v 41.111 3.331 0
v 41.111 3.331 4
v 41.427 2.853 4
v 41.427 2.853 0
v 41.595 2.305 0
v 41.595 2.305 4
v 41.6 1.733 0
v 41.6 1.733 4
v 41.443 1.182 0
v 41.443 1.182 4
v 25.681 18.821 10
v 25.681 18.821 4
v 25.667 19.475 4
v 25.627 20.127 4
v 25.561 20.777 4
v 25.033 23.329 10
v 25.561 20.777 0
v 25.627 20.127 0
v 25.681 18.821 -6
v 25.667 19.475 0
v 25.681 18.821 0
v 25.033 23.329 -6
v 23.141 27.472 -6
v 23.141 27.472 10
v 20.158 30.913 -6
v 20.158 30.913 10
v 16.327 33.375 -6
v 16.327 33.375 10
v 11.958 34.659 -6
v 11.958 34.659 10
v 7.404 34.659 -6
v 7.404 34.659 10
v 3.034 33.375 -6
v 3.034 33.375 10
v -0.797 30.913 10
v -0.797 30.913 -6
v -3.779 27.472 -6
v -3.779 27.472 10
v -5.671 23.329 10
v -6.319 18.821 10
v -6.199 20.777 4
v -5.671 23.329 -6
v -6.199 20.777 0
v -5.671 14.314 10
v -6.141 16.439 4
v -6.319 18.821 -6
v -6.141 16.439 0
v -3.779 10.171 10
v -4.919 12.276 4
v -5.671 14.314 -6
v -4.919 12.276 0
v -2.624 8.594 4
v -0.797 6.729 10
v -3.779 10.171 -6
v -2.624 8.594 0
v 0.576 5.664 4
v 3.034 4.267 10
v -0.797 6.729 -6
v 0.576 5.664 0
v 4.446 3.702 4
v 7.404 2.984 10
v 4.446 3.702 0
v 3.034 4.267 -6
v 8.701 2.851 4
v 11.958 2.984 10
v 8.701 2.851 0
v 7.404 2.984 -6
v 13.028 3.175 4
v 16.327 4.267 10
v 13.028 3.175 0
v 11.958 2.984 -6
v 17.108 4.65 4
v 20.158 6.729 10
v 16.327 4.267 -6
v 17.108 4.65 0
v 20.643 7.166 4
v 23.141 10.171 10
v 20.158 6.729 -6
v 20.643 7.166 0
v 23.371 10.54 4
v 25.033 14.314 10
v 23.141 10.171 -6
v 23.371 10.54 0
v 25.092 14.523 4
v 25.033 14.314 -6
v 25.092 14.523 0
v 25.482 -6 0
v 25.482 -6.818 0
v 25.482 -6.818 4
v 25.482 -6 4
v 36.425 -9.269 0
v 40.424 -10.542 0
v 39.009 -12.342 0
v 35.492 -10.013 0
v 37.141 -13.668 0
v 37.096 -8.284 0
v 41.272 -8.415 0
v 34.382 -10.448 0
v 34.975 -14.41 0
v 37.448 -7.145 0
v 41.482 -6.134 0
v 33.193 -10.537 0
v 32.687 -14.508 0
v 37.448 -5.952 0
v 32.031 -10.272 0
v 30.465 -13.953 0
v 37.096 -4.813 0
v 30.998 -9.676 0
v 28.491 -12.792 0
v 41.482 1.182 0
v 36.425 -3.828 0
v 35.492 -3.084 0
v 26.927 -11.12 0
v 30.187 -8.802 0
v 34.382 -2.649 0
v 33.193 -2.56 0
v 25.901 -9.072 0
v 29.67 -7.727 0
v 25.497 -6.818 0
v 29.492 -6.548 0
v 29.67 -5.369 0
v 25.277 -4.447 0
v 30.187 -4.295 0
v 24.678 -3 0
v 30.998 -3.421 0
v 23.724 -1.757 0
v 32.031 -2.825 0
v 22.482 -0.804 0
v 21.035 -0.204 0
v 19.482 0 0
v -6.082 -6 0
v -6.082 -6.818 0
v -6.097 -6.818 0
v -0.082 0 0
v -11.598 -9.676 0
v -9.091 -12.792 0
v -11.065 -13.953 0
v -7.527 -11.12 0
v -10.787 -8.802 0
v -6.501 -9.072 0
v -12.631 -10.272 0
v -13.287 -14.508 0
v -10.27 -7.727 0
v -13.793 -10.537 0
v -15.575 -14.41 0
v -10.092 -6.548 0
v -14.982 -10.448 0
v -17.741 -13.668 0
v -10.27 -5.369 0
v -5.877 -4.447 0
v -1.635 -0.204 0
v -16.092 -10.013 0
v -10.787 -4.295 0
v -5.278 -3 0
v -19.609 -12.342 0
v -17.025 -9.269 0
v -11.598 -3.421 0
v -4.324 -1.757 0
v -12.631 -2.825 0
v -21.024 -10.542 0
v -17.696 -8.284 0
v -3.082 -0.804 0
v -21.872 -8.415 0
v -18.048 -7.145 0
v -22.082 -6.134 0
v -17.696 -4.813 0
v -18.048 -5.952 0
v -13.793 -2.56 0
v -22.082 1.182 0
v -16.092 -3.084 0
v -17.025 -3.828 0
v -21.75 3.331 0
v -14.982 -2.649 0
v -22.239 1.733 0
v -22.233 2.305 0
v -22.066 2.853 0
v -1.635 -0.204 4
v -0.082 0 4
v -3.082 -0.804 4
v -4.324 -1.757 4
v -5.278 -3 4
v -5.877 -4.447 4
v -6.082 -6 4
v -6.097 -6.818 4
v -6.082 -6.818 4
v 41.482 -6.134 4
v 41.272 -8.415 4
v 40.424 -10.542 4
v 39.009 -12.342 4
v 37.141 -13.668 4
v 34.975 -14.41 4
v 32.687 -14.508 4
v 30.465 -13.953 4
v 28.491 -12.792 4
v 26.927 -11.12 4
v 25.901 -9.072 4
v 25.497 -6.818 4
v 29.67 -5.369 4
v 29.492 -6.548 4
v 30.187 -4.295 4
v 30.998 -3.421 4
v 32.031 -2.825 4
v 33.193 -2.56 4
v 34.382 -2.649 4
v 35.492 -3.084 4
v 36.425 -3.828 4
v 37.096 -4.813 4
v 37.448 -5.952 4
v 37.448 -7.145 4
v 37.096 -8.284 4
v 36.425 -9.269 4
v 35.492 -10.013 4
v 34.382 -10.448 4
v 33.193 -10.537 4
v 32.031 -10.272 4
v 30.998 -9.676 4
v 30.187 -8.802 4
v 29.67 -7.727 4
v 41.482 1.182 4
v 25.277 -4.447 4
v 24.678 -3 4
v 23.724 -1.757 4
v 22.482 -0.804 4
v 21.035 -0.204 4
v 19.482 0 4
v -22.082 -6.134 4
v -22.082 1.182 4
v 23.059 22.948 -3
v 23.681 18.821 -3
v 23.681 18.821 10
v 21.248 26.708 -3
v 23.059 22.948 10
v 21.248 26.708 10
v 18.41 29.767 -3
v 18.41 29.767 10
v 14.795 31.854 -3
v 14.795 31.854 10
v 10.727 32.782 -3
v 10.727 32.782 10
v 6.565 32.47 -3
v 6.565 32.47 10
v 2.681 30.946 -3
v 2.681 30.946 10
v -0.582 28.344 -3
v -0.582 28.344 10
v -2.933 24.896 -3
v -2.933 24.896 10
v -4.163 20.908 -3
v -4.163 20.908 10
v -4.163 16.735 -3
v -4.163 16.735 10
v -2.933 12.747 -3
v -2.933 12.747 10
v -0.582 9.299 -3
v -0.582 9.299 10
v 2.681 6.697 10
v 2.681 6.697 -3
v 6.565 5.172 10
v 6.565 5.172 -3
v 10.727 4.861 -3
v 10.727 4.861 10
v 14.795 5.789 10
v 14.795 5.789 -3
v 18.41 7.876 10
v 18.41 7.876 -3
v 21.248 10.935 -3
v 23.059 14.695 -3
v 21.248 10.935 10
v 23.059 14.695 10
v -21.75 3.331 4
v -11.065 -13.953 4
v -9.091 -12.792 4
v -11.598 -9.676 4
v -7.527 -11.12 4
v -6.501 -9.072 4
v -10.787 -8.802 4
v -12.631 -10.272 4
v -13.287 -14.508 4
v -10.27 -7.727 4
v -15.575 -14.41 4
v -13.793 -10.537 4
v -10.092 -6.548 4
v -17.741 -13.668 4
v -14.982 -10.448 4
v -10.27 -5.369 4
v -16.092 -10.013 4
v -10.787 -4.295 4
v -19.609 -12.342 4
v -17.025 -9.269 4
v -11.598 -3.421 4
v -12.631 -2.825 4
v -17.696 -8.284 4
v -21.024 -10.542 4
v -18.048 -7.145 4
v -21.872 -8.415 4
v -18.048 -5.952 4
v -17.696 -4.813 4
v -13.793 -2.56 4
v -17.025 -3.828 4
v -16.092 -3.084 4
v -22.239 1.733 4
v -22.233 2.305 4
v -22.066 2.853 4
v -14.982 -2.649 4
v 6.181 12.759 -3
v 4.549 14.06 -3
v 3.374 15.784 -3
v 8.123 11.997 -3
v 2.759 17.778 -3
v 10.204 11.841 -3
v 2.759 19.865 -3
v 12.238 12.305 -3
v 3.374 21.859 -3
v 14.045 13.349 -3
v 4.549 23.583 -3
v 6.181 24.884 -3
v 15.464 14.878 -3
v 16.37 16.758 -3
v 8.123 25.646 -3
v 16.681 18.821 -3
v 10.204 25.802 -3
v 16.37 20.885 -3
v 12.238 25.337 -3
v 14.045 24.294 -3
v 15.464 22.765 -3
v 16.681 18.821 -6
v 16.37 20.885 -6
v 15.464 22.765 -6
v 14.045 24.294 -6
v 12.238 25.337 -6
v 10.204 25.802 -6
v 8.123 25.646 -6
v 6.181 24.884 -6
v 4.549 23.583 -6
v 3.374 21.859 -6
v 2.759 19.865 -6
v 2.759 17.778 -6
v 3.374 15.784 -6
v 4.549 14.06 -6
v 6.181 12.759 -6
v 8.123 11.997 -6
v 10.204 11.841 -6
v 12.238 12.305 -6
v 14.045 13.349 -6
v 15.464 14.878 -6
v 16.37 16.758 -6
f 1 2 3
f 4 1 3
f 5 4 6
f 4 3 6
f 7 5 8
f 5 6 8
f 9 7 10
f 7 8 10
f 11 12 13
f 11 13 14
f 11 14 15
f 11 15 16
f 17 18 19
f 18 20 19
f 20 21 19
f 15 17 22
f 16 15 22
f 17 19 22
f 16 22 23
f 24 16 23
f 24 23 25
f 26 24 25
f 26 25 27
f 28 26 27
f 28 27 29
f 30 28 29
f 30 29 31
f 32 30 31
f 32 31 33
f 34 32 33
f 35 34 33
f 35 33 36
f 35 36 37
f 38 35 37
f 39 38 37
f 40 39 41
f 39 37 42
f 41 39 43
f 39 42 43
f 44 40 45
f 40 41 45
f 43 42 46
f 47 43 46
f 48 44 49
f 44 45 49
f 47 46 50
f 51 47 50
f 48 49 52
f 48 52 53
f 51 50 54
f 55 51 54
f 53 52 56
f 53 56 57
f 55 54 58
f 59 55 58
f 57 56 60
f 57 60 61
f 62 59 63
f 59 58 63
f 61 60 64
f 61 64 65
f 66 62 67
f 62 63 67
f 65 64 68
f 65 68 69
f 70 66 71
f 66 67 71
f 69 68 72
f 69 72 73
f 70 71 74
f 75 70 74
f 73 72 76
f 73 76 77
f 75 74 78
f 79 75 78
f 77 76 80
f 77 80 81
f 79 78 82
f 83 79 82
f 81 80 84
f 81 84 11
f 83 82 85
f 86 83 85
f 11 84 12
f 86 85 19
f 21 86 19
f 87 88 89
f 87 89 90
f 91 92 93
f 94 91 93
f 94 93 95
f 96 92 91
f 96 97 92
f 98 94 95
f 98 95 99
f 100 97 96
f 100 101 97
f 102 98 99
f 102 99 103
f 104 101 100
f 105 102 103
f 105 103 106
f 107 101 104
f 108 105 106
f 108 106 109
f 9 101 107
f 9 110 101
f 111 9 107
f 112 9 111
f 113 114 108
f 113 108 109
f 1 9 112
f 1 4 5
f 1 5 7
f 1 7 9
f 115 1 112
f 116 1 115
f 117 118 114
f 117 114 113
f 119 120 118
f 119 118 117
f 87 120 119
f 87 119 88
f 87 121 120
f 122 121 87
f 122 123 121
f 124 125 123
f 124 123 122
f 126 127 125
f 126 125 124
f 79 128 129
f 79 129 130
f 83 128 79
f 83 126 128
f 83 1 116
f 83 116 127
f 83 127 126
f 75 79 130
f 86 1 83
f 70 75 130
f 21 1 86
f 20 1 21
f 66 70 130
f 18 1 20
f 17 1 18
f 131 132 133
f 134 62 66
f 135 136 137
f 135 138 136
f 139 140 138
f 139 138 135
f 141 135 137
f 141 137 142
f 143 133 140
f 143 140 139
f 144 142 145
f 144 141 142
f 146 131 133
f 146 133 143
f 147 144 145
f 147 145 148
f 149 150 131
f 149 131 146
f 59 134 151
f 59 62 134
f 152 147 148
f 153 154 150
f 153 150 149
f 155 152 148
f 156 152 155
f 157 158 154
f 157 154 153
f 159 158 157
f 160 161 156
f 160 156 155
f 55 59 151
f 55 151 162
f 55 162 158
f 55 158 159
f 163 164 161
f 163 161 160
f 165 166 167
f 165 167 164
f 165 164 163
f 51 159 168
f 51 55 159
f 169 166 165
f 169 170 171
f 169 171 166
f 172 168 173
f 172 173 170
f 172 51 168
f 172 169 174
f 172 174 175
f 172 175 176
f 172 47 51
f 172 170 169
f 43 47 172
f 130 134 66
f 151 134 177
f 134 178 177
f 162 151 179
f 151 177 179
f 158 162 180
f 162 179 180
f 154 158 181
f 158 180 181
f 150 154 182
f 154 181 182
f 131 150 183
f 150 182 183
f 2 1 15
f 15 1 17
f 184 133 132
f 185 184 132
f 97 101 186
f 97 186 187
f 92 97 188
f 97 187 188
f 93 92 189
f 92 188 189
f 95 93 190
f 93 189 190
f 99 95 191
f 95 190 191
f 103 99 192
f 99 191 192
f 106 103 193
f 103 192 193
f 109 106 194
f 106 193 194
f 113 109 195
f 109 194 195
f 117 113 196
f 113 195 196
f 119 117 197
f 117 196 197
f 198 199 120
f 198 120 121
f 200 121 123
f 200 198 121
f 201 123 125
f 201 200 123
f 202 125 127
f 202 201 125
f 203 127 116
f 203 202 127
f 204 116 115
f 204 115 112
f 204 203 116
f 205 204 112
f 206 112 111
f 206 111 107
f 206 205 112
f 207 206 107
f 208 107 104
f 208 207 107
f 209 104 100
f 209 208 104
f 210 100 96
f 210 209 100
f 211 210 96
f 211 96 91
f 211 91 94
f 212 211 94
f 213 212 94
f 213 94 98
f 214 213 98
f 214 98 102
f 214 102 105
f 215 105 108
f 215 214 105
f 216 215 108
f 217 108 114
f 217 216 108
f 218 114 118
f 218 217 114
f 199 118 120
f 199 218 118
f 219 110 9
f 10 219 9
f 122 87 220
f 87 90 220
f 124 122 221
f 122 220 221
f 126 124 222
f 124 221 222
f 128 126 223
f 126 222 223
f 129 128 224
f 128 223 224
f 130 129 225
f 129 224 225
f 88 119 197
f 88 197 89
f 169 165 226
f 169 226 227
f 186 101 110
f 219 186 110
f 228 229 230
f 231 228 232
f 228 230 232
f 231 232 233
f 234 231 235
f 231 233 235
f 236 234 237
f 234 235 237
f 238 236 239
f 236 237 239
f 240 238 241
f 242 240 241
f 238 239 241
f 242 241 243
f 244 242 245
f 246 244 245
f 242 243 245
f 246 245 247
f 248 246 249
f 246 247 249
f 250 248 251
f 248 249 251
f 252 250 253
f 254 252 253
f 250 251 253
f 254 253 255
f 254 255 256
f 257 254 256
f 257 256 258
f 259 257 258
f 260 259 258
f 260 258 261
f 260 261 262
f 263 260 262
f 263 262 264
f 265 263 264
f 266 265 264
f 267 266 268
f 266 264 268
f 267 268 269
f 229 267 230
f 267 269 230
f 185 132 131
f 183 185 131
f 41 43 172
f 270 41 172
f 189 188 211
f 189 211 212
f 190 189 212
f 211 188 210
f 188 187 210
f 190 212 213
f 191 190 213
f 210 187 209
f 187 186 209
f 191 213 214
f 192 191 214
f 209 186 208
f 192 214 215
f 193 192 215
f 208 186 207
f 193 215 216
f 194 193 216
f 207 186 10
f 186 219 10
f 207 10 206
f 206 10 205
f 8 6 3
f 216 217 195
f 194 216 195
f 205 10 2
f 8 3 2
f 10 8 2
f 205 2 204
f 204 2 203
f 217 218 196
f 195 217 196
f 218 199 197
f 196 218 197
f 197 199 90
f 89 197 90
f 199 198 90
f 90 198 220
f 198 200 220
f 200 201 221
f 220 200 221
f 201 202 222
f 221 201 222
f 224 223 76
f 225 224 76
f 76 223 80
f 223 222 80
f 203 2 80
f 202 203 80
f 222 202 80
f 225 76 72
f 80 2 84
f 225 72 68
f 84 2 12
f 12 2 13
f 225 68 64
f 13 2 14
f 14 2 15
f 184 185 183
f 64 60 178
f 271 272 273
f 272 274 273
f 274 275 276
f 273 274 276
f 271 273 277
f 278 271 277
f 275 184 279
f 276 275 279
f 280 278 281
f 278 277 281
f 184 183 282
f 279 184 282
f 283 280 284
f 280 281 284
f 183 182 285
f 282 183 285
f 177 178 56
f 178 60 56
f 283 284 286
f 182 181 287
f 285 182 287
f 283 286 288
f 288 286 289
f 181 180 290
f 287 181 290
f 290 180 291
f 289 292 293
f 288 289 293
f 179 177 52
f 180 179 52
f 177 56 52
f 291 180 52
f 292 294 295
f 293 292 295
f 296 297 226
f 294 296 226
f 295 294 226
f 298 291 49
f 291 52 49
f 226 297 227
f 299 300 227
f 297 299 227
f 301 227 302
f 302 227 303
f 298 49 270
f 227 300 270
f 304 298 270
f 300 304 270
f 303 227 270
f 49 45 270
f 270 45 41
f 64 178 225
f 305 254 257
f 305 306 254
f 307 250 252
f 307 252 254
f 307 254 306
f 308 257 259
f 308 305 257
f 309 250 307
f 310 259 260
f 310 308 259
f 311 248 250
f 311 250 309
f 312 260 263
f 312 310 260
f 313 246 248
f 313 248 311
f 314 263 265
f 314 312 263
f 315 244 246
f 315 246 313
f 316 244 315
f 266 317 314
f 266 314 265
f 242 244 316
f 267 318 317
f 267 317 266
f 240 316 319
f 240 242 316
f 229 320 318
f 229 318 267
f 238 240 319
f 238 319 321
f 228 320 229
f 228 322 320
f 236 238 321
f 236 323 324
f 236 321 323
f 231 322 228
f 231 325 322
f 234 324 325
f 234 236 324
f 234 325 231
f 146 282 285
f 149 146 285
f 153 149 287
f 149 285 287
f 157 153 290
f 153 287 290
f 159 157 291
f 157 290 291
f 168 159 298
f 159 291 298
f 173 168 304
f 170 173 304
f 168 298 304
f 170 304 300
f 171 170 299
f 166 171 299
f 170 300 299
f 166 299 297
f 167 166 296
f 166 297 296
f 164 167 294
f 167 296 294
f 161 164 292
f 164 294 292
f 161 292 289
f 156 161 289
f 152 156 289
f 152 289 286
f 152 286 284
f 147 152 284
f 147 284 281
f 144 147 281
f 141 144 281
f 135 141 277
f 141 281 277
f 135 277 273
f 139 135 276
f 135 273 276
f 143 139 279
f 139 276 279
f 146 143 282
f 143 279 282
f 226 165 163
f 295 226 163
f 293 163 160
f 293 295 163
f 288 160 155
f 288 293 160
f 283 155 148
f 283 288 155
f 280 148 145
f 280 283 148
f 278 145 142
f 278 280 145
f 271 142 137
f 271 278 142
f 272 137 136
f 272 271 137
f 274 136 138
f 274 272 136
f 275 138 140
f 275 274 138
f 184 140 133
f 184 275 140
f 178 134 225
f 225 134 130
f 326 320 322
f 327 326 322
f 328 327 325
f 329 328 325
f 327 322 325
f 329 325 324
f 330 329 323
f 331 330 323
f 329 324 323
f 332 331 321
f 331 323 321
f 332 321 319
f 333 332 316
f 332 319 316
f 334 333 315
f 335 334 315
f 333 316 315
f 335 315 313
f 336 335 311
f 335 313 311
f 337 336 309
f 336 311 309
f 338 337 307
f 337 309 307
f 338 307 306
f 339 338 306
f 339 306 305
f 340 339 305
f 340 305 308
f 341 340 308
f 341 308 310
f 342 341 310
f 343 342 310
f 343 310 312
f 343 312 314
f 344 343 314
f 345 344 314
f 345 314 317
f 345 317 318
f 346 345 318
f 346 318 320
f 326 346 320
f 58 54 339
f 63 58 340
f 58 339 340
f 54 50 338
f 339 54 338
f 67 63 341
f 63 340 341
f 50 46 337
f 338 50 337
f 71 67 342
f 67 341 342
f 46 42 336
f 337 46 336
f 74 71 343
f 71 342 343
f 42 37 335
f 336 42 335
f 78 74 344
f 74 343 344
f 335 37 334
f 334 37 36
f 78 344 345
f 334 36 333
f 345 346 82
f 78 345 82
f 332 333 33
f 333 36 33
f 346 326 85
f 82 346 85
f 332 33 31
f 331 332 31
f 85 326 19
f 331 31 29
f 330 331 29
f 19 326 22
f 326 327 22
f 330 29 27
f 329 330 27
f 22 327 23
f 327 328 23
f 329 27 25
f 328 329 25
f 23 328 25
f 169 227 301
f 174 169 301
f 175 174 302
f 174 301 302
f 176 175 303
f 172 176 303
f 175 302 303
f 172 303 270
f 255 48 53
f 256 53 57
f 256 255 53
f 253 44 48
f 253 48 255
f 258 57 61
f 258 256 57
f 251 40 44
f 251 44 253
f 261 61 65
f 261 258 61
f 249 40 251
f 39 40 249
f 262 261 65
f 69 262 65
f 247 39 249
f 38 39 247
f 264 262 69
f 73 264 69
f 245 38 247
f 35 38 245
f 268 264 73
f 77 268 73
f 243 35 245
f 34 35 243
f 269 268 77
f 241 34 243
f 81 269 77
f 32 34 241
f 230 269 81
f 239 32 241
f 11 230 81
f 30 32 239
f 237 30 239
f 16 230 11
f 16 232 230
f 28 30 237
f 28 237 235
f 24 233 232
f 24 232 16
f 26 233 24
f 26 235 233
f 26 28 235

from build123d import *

# Parameters (mm, degrees)
BOSS_EXTRUDE1_DEPTH      = 4
FILLET1_R                = 8
FILLET2_R                = 2
SKETCH3_W                = 16
SKETCH3_H                = 8
BOSS_EXTRUDE2_DEPTH      = 4
SKETCH10_R               = 8
BOSS_EXTRUDE3_DEPTH      = 4
FILLET3_R                = 6
SKETCH11_R               = 4
CUT_EXTRUDE2_DEPTH       = 4
FILLET3_OF_MIRROR1_R     = 6
BOSS_EXTRUDE4_DEPTH      = 6
BOSS_EXTRUDE4_DEPTH_BACK = 10
SKETCH8_R                = 16
SKETCH13_R               = 14
CUT_EXTRUDE3_DEPTH       = 13
SKETCH17_R               = 7
CUT_EXTRUDE4_DEPTH       = 13


with BuildPart() as part:
    # Sketch2 → Boss-Extrude1 (new body)
    with BuildSketch(Plane.XY):
        Polygon((-24.718317205, 0), (44.079761222, 0), (9.680722008, 38.594041061), align=None)
    extrude(amount=BOSS_EXTRUDE1_DEPTH)

    # Fillet1
    fillet1_edges = [part.edges().sort_by_distance(p)[0] for p in [
        (9.680722008, 38.594041061, 2),
    ]]
    fillet(fillet1_edges, radius=FILLET1_R)

    # Fillet2
    fillet2_edges = [part.edges().sort_by_distance(p)[0] for p in [
        (44.079761222, 0, 2),
        (-24.718317205, 0, 2),
    ]]
    fillet(fillet2_edges, radius=FILLET2_R)

    # Sketch3 → Boss-Extrude2 (add)
    with BuildSketch(Plane.XY):
        with Locations((-14.081618267, -2.818082449)):
            Rectangle(SKETCH3_W, SKETCH3_H)
    boss_extrude2 = extrude(amount=BOSS_EXTRUDE2_DEPTH)

    # Sketch10 → Boss-Extrude3 (add)
    with BuildSketch(Plane.XY.offset(4)):
        with Locations((-14.092338513, -6.548407243)):
            Circle(SKETCH10_R)
    boss_extrude3 = extrude(amount=-BOSS_EXTRUDE3_DEPTH)

    # Fillet3
    fillet3_edges = [part.edges().sort_by_distance(p)[0] for p in [
        (-6.081618267, 0, 2),
    ]]
    fillet(fillet3_edges, radius=FILLET3_R)

    # Sketch11 → Cut-Extrude2 (cut)
    with BuildSketch(Plane.XY.offset(4)):
        with Locations((-14.092338513, -6.548407243)):
            Circle(SKETCH11_R)
    cut_extrude2 = extrude(amount=-CUT_EXTRUDE2_DEPTH, mode=Mode.SUBTRACT)

    # Mirror1: Boss-Extrude2, Boss-Extrude3, Cut-Extrude2 across plane
    add(boss_extrude2.mirror(Plane(origin=(9.7, 0, 0), x_dir=(0, 0, 1), z_dir=(1, 0, 0))))
    add(boss_extrude3.mirror(Plane(origin=(9.7, 0, 0), x_dir=(0, 0, 1), z_dir=(1, 0, 0))))
    add(cut_extrude2.mirror(Plane(origin=(9.7, 0, 0), x_dir=(0, 0, 1), z_dir=(1, 0, 0))), mode=Mode.SUBTRACT)

    # Fillet3 of Mirror1
    fillet3_of_mirror1_edges = [part.edges().sort_by_distance(p)[0] for p in [
        (25.481618267, 0, 2),
    ]]
    fillet(fillet3_of_mirror1_edges, radius=FILLET3_OF_MIRROR1_R)

    # Sketch8 → Boss-Extrude4 (add, two sides: drawn at the far end of the back side and taken through both)
    with BuildSketch(Plane.XY.offset(4).offset(-BOSS_EXTRUDE4_DEPTH_BACK)):
        with Locations((9.680722008, 18.821374391)):
            Circle(SKETCH8_R)
    extrude(amount=BOSS_EXTRUDE4_DEPTH + BOSS_EXTRUDE4_DEPTH_BACK)

    # Sketch13 → Cut-Extrude3 (cut)
    with BuildSketch(Plane.XY.offset(10)):
        with Locations((9.680722008, 18.821374391)):
            Circle(SKETCH13_R)
    extrude(amount=-CUT_EXTRUDE3_DEPTH, mode=Mode.SUBTRACT)

    # Sketch17 → Cut-Extrude4 (cut)
    with BuildSketch(Plane.XY.offset(-3)):
        with Locations((9.680722008, 18.821374391)):
            Circle(SKETCH17_R)
    extrude(amount=-CUT_EXTRUDE4_DEPTH, mode=Mode.SUBTRACT)


solid = part.part
